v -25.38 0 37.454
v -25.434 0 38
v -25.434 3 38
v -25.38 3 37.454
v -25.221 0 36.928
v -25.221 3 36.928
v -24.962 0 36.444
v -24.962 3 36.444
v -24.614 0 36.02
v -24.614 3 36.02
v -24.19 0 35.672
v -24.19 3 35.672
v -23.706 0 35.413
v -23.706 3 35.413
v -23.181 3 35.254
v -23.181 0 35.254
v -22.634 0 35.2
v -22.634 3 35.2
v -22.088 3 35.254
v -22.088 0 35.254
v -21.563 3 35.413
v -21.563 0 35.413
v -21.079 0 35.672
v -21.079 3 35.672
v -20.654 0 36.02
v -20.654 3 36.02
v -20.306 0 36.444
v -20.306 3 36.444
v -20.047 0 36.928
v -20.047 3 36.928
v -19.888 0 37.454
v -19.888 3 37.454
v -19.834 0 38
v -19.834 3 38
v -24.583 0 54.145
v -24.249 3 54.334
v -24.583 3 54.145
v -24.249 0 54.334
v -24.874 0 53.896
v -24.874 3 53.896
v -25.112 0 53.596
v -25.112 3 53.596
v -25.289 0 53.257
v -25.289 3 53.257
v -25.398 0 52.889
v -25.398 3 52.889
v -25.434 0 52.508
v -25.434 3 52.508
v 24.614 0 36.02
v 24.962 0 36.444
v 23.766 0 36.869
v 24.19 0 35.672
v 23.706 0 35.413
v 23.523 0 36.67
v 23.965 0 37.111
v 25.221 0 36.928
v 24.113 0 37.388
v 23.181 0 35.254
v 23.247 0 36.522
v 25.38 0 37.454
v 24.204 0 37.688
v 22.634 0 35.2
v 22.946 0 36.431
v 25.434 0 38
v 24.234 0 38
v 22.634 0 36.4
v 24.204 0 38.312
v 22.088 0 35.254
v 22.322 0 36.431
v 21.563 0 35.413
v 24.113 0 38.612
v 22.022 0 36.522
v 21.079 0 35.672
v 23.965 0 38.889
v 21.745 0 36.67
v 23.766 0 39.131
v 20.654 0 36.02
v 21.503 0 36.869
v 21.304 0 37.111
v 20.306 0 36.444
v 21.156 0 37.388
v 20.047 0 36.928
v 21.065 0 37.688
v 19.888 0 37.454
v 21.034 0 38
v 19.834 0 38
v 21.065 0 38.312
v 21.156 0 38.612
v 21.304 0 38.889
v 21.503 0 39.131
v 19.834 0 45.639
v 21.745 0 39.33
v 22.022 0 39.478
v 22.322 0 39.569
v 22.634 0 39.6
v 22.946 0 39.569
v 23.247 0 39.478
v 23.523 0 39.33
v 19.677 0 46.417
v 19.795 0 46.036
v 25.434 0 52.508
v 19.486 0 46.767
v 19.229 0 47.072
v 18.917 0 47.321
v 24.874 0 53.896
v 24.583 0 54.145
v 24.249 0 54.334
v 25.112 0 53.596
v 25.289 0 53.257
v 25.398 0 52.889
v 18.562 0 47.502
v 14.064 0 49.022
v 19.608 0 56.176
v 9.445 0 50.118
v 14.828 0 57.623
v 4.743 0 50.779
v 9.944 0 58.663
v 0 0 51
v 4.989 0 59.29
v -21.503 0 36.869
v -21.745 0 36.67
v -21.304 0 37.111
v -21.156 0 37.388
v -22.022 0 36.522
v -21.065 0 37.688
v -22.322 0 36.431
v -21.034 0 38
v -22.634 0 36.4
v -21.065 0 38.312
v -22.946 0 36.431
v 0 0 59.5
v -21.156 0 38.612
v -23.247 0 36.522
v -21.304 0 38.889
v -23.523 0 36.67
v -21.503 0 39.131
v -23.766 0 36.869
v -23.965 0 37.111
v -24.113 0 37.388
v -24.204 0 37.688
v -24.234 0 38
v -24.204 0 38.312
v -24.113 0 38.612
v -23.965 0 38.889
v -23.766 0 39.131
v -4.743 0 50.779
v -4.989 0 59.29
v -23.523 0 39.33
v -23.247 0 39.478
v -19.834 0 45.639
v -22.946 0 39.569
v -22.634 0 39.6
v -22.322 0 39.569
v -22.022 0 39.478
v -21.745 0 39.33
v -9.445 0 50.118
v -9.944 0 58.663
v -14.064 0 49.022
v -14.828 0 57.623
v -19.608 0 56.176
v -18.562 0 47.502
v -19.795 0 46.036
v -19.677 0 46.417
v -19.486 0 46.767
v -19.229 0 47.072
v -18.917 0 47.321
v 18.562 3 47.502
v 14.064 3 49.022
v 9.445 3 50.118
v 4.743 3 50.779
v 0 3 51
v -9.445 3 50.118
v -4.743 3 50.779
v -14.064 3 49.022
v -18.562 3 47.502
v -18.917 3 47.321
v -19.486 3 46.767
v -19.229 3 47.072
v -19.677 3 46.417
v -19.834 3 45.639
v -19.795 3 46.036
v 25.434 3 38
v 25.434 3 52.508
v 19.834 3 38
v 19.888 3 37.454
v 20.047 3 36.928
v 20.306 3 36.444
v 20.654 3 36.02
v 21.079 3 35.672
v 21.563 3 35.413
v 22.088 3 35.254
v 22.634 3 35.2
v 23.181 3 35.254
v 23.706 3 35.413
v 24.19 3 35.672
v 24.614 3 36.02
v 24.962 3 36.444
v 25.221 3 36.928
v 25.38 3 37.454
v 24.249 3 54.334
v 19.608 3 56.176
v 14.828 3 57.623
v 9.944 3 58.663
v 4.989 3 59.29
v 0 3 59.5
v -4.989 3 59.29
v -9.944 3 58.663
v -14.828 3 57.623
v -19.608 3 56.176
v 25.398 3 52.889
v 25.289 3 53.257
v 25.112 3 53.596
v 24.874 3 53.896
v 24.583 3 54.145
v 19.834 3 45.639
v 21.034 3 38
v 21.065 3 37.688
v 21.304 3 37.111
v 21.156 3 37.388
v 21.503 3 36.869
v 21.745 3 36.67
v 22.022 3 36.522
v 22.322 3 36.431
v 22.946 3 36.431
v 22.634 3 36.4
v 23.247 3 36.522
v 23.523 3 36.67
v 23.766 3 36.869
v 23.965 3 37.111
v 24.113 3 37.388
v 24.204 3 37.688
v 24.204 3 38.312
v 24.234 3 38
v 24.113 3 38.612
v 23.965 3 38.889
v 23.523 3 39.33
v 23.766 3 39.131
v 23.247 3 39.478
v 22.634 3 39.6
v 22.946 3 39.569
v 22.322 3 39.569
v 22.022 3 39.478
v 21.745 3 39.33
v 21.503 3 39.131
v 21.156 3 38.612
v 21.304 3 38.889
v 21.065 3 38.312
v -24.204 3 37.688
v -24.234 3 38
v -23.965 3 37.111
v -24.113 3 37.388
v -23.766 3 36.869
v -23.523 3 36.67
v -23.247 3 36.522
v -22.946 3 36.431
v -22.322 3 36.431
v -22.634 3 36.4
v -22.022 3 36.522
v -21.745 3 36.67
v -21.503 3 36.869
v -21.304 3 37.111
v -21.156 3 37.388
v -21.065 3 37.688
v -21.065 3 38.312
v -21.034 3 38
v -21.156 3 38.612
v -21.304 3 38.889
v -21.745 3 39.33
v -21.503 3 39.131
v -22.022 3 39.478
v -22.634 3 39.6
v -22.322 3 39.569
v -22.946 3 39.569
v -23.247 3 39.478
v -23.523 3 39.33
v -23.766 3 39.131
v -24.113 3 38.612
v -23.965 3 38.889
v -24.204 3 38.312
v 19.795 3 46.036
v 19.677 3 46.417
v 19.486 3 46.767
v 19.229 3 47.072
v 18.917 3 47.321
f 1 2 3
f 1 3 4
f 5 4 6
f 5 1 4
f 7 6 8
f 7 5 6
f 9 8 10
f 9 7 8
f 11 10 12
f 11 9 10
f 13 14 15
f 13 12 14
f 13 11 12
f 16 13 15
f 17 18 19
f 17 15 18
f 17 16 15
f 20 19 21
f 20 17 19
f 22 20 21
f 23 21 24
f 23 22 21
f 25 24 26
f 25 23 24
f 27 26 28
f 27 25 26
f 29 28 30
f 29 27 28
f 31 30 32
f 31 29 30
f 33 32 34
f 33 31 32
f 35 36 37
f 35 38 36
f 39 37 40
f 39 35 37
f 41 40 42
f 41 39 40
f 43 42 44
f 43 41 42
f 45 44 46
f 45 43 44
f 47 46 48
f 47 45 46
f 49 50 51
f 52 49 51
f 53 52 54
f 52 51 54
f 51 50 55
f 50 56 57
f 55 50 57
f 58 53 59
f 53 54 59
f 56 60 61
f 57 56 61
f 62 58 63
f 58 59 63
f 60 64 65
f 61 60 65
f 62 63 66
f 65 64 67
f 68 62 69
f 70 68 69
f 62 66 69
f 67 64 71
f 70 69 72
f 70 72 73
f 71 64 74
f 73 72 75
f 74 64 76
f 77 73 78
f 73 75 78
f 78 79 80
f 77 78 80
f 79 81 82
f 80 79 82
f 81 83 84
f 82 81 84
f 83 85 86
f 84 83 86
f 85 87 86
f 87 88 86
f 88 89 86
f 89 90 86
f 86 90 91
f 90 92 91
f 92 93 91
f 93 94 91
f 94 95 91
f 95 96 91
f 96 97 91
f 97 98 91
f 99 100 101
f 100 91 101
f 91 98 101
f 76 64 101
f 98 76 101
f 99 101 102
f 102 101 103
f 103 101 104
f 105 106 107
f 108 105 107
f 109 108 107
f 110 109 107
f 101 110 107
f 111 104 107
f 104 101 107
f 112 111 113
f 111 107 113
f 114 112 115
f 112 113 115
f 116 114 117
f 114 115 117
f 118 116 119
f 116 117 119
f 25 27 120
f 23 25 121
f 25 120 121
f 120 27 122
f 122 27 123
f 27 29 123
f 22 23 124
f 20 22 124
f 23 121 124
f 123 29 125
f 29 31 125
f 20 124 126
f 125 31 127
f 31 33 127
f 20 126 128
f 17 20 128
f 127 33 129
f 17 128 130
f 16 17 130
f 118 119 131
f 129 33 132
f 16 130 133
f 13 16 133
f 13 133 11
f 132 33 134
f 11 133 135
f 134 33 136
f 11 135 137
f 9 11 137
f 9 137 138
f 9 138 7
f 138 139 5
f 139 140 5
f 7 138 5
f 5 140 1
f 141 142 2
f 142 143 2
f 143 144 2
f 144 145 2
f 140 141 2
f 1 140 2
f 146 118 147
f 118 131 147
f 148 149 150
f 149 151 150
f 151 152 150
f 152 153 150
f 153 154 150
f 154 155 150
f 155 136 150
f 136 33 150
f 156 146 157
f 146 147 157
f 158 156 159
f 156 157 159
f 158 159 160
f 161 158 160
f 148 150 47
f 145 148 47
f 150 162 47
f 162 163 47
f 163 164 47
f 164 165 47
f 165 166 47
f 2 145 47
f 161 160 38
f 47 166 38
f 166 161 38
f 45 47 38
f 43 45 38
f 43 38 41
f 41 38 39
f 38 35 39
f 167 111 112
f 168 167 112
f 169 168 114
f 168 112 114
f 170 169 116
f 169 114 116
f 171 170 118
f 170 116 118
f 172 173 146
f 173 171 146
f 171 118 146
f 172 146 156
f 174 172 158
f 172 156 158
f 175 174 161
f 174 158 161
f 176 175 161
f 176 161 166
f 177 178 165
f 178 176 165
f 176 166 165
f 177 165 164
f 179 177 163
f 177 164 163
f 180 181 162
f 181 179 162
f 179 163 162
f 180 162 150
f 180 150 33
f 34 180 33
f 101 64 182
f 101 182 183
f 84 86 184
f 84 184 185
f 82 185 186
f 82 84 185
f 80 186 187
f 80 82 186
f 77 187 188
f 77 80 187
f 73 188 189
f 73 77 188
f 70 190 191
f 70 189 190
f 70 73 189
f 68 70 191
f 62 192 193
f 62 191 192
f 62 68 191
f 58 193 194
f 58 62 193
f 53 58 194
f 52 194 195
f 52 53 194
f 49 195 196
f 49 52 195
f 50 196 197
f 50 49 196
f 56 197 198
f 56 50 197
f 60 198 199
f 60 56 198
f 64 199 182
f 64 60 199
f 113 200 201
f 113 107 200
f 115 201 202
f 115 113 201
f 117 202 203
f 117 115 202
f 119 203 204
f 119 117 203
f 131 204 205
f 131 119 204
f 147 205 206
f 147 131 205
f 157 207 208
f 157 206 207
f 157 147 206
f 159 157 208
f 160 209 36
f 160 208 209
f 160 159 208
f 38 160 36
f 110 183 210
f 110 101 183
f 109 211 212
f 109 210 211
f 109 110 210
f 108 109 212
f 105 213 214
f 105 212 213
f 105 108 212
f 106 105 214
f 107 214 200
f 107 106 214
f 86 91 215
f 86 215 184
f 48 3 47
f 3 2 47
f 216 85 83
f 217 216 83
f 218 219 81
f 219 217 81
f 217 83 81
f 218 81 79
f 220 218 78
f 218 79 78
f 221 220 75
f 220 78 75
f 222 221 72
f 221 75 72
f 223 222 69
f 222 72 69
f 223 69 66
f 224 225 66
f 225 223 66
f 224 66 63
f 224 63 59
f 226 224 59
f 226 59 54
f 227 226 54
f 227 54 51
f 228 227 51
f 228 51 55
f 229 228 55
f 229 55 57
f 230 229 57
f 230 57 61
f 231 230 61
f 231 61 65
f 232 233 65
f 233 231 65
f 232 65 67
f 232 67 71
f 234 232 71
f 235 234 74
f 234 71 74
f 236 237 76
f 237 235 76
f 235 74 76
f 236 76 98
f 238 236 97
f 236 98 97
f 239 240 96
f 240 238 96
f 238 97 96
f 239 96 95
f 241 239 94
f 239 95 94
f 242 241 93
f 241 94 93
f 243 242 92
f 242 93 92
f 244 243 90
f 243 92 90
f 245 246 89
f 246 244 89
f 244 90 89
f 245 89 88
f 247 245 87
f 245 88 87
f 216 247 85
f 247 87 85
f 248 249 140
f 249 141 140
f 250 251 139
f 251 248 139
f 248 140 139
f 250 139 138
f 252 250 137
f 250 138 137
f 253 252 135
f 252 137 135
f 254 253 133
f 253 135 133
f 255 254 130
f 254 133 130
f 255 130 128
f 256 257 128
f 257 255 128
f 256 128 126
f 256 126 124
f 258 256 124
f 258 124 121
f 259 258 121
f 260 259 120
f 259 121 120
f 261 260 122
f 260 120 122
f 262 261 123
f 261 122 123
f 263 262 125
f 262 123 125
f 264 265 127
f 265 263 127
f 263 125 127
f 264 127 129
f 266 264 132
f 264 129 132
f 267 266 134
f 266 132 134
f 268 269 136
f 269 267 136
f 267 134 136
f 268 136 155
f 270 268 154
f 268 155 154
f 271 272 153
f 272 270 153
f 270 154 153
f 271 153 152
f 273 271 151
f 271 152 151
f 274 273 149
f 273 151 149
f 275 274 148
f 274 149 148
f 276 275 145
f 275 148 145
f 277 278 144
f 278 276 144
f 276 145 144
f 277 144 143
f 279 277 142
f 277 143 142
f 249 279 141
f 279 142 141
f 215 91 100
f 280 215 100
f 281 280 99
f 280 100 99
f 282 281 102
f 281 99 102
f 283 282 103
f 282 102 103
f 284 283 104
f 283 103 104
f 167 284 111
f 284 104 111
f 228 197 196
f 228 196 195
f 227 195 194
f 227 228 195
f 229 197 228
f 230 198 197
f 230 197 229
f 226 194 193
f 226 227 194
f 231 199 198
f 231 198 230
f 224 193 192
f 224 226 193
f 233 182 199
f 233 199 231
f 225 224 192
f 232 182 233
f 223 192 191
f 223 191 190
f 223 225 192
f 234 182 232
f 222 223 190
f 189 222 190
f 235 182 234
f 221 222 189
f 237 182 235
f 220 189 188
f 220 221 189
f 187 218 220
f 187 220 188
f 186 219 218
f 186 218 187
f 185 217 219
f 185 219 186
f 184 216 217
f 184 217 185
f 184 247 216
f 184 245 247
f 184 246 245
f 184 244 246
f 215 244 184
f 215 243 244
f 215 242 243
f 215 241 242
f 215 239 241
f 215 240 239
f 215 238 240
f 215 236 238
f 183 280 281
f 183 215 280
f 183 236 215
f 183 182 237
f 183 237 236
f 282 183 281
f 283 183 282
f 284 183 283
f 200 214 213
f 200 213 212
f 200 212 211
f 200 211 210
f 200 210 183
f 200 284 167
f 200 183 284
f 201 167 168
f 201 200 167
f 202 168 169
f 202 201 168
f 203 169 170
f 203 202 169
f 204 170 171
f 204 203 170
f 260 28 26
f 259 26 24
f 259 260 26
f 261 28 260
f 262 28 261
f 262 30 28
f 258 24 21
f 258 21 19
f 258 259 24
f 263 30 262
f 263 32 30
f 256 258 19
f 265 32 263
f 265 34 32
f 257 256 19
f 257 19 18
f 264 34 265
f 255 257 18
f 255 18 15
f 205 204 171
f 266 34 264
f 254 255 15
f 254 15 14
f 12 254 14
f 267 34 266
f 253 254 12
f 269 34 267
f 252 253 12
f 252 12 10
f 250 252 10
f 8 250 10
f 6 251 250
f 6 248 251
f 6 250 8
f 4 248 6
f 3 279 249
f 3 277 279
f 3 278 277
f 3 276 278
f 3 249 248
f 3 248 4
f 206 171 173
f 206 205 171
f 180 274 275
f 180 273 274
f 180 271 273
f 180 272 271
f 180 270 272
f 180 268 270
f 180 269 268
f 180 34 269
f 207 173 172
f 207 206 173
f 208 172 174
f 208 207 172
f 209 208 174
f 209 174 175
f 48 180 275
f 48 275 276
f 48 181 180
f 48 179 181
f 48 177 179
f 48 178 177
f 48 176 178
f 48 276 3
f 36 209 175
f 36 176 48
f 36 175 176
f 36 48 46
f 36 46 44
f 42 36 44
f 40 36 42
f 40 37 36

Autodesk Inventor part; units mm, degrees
ref_plane "YZ Plane" through (0, 0, 0) normal (1, 0, 0) x (0, 1, 0)
ref_plane "XZ Plane" through (0, 0, 0) normal (0, 1, 0) x (-1, 0, 0)
ref_plane "XY Plane" through (0, 0, 0) normal (0, 0, 1) x (1, 0, 0)
sketch "Sketch1" plane through (0, 0, 0) normal (0, 1, 0) x (-1, 0, 0)
  circle A0 centre (22.6343, 38) radius 1.6
  circle A1 centre (-22.6343, 38) radius 1.6
  arc A2 (19.8343, 38) -> (25.4343, 38) centre (22.6343, 38) ccw
  arc A3 (-25.4343, 38) -> (-19.8343, 38) centre (-22.6343, 38) ccw
  line L0 (-25.4343, 38) -> (-25.4343, 52.5079)
  line L1 (25.4343, 38) -> (25.4343, 52.5079)
  arc A4 (18.5623, 47.502) -> (-18.5623, 47.502) centre (0, 0) ccw
  line L2 (19.8343, 45.6392) -> (19.8343, 38)
  line L3 (-19.8343, 45.6392) -> (-19.8343, 38)
  arc A5 (24.2494, 54.3343) -> (-24.2494, 54.3343) centre (0, 0) ccw
  arc A6 (25.4343, 52.5079) -> (24.2494, 54.3343) centre (23.4343, 52.5079) ccw
  arc A7 (19.8343, 45.6392) -> (18.5623, 47.502) centre (17.8343, 45.6392) ccw
  arc A8 (-24.2494, 54.3343) -> (-25.4343, 52.5079) centre (-23.4343, 52.5079) ccw
  arc A9 (-18.5623, 47.502) -> (-19.8343, 45.6392) centre (-17.8343, 45.6392) ccw
  point P0 (-25.4343, 53.7898)
  point P1 (25.4343, 53.7898)
  point P2 (19.8343, 46.9851)
  point P3 (-19.8343, 46.9851)
  dimension "d3" = 3.2
  dimension "d4" = 2.8
  dimension "d5" = 2.8
  dimension "d7" = 2
extrude "Extrusion1" add sketch "Sketch1" along normal blind 3
properties part number "Light Sensor Cover"
